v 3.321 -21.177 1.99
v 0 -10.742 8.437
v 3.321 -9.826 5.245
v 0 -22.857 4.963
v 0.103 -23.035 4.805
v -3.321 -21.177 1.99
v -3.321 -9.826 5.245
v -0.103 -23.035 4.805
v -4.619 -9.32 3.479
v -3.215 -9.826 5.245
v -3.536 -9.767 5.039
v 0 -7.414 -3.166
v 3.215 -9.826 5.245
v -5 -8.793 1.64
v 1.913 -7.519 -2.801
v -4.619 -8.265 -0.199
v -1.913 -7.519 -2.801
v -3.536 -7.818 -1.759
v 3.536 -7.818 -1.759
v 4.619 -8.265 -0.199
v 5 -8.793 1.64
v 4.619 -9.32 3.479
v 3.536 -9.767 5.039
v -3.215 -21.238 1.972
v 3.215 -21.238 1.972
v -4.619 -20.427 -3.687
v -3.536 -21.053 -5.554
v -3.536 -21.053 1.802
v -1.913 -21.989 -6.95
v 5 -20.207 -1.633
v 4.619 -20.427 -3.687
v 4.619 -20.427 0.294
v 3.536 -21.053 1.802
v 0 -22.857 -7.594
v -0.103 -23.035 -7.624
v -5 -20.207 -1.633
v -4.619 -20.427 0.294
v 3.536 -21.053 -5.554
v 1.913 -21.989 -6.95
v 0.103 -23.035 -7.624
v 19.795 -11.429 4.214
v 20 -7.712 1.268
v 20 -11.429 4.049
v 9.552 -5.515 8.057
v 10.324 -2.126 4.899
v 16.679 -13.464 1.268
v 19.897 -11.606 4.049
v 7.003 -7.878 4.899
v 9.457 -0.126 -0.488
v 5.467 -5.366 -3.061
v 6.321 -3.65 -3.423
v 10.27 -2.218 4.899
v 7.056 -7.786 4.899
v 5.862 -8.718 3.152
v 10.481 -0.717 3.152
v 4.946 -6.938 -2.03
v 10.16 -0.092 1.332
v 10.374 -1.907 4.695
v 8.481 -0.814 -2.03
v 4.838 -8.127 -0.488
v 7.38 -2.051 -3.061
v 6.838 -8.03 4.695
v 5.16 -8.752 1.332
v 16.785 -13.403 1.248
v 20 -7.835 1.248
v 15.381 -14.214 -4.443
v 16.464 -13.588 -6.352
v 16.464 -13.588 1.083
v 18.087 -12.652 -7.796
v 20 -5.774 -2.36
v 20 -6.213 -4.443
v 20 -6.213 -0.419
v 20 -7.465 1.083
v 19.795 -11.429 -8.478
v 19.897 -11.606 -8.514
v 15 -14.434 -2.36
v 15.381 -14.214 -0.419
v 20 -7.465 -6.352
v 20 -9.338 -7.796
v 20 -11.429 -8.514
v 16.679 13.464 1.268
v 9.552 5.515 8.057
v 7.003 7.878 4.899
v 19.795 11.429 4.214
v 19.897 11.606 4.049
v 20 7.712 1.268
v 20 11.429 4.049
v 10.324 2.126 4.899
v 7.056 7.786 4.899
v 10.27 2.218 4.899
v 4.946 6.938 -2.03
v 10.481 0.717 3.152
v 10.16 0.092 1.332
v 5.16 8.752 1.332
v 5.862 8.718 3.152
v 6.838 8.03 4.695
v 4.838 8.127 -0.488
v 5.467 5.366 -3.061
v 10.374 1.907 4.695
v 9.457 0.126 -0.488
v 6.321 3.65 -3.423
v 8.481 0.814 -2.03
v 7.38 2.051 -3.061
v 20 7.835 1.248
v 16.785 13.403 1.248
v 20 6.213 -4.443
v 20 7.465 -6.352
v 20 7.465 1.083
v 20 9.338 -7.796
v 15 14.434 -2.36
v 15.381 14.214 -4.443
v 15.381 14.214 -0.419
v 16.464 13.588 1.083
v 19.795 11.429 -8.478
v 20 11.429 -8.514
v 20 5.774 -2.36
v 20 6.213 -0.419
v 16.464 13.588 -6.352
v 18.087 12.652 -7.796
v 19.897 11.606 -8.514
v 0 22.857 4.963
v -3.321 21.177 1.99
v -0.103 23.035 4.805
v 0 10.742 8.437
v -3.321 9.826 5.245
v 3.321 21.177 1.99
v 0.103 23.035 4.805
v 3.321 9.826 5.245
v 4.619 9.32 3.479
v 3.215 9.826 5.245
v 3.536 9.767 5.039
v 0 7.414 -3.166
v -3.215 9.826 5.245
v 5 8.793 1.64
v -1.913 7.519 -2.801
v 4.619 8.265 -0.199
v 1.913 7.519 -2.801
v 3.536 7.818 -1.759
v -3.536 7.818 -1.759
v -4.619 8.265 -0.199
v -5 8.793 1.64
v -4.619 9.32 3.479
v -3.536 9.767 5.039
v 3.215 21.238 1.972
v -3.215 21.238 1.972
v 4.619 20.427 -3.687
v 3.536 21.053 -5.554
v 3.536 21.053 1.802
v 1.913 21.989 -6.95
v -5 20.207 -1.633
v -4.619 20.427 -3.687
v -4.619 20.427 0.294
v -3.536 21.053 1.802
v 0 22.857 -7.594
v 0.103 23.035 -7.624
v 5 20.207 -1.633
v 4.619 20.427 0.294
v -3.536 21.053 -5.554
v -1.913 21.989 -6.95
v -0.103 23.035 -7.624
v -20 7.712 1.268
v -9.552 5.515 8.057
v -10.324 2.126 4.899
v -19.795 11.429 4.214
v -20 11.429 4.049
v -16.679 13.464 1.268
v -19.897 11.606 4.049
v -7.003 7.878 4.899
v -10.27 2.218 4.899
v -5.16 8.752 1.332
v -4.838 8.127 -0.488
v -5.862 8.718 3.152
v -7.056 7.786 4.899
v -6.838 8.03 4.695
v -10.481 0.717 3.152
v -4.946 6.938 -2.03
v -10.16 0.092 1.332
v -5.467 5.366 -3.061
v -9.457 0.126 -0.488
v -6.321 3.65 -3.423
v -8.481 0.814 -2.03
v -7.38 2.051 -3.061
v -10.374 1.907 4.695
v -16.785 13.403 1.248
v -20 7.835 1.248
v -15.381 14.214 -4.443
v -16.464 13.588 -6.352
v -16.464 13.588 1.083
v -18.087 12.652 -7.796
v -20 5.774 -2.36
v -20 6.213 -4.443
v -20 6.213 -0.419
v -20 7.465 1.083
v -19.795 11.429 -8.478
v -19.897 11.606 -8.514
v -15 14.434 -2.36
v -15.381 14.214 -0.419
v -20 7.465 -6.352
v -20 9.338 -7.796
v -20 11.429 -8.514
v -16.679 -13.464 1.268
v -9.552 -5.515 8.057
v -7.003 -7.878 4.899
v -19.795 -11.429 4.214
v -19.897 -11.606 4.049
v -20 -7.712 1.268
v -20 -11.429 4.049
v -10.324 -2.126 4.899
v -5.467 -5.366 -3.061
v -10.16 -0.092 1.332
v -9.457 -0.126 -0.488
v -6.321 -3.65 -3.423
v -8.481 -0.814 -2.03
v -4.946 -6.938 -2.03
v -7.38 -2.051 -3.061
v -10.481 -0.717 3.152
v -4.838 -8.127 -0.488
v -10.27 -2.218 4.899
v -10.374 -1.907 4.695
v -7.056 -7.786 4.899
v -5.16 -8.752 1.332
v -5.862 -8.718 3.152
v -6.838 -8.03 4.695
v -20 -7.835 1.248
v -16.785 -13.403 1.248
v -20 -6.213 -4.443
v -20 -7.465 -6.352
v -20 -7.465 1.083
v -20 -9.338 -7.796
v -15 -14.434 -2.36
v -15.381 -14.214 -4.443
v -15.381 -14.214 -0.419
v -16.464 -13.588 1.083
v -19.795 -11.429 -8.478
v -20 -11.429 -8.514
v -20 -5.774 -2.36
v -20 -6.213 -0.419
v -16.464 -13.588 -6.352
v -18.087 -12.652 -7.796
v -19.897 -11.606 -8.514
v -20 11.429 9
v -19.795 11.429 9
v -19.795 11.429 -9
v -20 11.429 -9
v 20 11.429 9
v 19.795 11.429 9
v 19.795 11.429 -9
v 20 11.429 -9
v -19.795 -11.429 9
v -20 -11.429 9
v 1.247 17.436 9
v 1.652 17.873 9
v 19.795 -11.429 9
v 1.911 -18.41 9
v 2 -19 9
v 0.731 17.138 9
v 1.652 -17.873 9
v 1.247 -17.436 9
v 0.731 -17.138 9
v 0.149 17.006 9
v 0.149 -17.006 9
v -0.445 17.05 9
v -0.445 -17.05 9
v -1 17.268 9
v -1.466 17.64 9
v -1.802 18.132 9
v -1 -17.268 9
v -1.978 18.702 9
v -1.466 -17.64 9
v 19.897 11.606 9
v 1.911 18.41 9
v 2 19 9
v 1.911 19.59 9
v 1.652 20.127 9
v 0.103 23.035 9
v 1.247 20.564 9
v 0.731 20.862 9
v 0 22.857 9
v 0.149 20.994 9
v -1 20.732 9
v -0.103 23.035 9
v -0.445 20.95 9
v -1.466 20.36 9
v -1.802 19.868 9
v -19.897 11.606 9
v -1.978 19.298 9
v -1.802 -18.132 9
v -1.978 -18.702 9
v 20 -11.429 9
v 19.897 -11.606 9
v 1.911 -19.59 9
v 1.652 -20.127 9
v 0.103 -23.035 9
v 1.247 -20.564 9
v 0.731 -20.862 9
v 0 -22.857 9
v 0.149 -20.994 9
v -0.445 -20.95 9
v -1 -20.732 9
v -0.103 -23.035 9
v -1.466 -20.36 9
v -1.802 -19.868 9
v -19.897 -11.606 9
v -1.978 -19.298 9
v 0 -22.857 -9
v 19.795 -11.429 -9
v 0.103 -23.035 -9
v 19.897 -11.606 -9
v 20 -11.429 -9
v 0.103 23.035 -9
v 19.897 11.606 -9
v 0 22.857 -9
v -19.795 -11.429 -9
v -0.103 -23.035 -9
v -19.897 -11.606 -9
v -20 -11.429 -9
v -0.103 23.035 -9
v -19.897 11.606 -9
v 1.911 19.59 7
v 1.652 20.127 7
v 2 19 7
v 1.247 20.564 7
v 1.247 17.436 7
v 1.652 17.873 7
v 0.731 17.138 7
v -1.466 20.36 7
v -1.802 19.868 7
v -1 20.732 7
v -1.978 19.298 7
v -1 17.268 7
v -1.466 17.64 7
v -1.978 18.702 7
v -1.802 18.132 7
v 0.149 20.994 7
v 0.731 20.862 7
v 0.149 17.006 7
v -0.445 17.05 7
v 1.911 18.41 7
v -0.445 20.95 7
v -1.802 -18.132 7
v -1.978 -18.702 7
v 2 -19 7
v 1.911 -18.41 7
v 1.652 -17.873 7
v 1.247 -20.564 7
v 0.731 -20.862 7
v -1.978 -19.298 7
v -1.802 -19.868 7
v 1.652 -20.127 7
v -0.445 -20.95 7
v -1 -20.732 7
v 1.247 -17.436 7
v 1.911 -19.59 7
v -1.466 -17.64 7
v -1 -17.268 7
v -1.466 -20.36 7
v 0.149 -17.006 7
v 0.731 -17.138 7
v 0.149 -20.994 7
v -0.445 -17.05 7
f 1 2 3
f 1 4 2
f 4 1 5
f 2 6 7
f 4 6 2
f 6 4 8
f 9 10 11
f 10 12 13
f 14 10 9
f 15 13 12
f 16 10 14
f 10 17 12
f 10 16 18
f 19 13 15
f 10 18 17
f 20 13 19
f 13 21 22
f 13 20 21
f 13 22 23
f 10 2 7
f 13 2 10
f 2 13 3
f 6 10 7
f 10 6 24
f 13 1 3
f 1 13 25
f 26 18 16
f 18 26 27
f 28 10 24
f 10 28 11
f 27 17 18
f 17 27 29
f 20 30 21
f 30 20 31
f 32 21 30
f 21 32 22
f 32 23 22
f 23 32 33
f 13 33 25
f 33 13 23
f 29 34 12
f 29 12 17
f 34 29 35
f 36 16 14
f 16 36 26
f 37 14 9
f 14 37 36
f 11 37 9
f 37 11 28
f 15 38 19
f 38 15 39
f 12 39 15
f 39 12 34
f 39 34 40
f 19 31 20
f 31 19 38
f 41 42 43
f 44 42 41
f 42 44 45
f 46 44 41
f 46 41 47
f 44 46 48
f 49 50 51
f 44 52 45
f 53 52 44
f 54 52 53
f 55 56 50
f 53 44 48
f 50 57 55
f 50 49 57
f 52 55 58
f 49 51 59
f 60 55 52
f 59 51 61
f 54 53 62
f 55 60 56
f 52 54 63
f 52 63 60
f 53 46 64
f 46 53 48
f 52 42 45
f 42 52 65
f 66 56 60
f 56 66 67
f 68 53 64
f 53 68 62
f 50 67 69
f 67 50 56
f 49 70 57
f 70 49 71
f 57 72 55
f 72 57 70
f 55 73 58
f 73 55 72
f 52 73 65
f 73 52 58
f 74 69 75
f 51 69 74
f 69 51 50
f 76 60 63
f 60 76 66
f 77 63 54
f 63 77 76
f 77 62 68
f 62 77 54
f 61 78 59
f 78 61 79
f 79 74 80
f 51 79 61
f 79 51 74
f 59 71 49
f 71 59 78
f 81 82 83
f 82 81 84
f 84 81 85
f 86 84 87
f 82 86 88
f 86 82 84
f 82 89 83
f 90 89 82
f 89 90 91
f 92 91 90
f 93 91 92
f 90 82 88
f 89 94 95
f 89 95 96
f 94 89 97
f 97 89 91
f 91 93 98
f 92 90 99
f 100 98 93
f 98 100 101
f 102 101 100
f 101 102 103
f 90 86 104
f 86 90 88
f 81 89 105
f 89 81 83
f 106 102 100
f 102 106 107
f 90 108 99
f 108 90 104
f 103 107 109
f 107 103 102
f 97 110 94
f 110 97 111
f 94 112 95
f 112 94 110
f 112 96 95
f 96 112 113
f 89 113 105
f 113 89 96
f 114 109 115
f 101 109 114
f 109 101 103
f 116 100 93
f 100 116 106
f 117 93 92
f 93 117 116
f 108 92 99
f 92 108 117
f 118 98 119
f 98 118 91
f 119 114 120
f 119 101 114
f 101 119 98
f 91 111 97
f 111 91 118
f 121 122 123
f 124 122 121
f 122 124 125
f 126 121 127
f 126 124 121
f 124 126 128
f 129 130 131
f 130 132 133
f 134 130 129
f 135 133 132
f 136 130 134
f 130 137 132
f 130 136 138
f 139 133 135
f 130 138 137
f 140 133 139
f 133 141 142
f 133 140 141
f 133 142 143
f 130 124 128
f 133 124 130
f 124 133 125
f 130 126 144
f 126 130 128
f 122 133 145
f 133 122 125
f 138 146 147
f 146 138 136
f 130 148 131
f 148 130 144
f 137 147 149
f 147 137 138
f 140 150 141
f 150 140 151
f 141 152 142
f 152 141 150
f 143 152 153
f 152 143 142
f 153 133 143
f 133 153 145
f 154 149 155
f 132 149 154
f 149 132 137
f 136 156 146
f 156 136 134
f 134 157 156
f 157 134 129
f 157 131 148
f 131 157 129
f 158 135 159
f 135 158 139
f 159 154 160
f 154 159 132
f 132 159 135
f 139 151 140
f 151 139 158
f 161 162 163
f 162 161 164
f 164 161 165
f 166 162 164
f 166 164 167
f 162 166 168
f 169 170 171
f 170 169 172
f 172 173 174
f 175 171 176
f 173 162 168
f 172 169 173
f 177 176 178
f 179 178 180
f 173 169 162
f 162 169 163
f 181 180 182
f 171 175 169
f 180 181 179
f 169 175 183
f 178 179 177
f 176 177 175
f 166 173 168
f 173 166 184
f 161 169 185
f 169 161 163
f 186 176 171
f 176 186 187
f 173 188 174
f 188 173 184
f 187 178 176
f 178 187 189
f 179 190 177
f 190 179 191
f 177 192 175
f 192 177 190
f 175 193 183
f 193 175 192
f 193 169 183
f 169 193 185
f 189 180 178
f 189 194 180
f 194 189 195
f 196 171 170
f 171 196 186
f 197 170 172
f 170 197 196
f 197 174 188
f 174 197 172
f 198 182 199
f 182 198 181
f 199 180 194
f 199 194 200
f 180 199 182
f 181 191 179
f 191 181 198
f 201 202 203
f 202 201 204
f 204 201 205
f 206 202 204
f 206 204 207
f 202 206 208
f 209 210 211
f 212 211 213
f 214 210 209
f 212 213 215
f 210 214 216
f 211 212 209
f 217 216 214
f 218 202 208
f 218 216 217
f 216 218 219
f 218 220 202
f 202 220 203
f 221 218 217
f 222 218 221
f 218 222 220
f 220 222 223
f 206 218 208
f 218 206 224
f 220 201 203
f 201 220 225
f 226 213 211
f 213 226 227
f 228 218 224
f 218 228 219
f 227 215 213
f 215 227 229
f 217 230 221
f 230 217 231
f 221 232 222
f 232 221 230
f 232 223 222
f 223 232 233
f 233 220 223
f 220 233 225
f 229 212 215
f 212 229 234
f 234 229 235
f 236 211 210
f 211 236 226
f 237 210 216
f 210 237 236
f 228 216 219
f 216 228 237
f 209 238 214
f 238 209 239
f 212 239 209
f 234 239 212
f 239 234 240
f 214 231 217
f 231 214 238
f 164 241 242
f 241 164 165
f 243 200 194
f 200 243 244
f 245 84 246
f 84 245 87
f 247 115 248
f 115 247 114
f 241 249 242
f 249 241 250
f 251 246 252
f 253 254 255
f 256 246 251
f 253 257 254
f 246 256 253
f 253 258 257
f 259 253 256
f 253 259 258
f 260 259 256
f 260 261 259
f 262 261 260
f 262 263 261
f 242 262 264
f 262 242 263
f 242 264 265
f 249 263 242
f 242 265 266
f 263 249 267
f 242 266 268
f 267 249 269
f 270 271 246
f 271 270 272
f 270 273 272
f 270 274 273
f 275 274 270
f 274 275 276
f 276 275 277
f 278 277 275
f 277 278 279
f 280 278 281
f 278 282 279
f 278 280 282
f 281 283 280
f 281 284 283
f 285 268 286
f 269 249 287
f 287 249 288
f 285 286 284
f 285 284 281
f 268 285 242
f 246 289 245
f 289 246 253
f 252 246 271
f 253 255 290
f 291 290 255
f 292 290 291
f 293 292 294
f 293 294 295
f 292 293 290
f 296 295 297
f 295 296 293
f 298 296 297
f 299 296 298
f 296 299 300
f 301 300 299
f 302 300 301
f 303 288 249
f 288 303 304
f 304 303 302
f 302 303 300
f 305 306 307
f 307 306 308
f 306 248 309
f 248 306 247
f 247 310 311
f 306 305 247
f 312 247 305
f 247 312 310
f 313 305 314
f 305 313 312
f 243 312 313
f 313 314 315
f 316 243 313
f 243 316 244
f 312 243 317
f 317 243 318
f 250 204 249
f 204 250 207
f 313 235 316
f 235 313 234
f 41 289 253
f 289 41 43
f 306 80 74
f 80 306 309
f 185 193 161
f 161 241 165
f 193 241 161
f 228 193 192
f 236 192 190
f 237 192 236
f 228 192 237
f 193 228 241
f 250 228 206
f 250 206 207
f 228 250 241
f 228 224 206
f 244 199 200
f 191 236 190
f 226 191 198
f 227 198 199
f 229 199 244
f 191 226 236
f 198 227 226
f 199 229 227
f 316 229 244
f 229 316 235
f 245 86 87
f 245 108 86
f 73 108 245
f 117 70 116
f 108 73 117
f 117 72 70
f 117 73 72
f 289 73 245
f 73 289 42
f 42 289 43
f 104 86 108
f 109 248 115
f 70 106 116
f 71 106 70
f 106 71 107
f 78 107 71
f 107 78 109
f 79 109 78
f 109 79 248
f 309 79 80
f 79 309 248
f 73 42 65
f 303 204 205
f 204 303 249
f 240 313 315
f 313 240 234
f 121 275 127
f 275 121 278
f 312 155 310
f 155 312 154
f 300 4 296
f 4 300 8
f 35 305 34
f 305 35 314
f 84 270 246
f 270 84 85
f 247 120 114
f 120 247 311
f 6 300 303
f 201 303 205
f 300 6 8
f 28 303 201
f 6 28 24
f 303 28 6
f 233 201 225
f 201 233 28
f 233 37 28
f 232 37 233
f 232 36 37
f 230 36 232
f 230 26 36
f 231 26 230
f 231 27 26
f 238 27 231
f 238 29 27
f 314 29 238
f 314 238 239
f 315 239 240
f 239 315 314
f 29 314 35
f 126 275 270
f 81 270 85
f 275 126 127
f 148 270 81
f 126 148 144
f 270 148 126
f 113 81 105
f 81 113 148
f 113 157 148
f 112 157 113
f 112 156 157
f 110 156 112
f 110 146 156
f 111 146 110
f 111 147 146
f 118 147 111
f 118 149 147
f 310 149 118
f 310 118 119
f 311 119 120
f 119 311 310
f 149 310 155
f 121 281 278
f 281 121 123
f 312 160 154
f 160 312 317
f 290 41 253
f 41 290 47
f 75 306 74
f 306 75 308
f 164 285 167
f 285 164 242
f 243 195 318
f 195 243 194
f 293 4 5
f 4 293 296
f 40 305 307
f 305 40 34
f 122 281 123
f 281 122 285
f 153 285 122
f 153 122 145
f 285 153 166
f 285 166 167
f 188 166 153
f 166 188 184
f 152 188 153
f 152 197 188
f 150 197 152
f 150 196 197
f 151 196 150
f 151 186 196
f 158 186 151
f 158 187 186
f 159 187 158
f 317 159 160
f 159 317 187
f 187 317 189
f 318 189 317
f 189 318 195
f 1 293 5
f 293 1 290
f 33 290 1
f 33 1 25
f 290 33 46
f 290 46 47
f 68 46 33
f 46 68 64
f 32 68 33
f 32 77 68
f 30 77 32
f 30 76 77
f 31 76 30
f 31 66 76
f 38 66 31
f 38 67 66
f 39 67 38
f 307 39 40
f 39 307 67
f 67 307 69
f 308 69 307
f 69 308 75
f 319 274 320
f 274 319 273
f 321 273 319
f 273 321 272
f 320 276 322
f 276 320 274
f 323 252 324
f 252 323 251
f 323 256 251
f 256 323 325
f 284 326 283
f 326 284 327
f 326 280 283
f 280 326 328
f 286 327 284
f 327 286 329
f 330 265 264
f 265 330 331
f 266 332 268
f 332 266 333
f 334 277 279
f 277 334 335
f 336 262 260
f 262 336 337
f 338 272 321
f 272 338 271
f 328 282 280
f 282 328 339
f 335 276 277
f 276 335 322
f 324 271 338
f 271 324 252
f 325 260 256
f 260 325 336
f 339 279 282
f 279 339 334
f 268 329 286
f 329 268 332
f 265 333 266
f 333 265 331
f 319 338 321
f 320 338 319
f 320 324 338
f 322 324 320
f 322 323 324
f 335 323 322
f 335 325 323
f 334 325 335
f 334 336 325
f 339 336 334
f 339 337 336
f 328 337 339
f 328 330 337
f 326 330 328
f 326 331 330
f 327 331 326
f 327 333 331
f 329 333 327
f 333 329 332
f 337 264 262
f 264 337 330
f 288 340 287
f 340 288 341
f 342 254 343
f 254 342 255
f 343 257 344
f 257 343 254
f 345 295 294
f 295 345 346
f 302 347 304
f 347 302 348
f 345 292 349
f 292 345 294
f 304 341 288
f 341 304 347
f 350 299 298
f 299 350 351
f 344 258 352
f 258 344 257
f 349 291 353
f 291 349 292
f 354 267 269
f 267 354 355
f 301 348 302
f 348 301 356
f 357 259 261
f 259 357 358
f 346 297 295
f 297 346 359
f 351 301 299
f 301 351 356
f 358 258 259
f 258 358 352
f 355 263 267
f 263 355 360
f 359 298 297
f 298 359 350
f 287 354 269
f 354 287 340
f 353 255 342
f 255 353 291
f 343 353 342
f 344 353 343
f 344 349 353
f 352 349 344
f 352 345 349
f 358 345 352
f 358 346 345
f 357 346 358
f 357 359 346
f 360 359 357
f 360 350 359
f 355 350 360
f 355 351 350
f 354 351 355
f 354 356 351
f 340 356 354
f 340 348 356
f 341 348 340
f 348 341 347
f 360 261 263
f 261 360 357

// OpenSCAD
/*
  DOMEKIT-2V • HEXAGON
  http://effalo.com

  Math based on:
  http://www.desertdomes.com/dome2calc.html  
  
  Original OpenSCAD code by c60:
  http://www.thingiverse.com/thing:1719
  
  openSCAD shapes library by Catarina Mota:
  http://svn.makerbot.com/users/hoeken/openscad/shapes.scad
*/

strutradius = 5;
holedepth = 38;

module tearDrop(radius, height) {
  union(){
    cylinder(h=height,r=radius,center=true);
    intersection(){
      rotate(45,[0, 0, 1]) scale([1, 1, height]) cube(size=2*radius, center = true);
      translate([1.75*radius,0,0]) scale([1,1,height/10]) cube(size=2*radius, center=true);
    }
  }
}

module hexagon(height, depth) {
  boxWidth=height/1.75;
  union(){
    box(boxWidth, height, depth);
    rotate([0,0,60]) box(boxWidth, height, depth);
    rotate([0,0,-60]) box(boxWidth, height, depth);
  }
}

module box(w,h,d) {
  scale ([w,h,d]) cube(1, true);
}

module buckyBracket(folds) {
  bracketradius=40;
  bracketheight=20;

  difference() {
    scale ([bracketradius,bracketradius,bracketheight]){
      scale ([1/10,1/10,1/10]){
        rotate([0,0,18]){
          cylinder (r=10,h=10,center=true, $fn=21);
        }
      }
    }
    for ( i= [0:folds-1]) {
      rotate (a=[0,0,i*(360/folds)]){
        if (i%3 == 0) {
          // 2V B STRUTS @ 16°
          rotate (a=[(90+16),0,0]){
            translate ([0,4,0]){
              rotate([0,0,90]){
                translate ([0,0,27]){
                  tearDrop(strutradius, holedepth);
                }
              }
            }
          }
        }
        if (i%3 != 0){
          // 2V A STRUTS @ 18°	
          rotate (a=[(90+18),0,0]){
            translate ([0,4,0]){
              rotate([0,0,90]){
                translate ([0,0,27]){
                  tearDrop(strutradius, holedepth);
                }
              }
            }
          }
        }
      }
    }
  }
}

difference() {
  intersection() {
    buckyBracket(6, 5);
    rotate([0,0,90]) { hexagon(40, 18); }
  }
  translate([00,19,7]) {cylinder(r=2, h=10, $fn=21);}
  translate([00,-19,7]) {cylinder(r=2, h=10, $fn=21);}
}
